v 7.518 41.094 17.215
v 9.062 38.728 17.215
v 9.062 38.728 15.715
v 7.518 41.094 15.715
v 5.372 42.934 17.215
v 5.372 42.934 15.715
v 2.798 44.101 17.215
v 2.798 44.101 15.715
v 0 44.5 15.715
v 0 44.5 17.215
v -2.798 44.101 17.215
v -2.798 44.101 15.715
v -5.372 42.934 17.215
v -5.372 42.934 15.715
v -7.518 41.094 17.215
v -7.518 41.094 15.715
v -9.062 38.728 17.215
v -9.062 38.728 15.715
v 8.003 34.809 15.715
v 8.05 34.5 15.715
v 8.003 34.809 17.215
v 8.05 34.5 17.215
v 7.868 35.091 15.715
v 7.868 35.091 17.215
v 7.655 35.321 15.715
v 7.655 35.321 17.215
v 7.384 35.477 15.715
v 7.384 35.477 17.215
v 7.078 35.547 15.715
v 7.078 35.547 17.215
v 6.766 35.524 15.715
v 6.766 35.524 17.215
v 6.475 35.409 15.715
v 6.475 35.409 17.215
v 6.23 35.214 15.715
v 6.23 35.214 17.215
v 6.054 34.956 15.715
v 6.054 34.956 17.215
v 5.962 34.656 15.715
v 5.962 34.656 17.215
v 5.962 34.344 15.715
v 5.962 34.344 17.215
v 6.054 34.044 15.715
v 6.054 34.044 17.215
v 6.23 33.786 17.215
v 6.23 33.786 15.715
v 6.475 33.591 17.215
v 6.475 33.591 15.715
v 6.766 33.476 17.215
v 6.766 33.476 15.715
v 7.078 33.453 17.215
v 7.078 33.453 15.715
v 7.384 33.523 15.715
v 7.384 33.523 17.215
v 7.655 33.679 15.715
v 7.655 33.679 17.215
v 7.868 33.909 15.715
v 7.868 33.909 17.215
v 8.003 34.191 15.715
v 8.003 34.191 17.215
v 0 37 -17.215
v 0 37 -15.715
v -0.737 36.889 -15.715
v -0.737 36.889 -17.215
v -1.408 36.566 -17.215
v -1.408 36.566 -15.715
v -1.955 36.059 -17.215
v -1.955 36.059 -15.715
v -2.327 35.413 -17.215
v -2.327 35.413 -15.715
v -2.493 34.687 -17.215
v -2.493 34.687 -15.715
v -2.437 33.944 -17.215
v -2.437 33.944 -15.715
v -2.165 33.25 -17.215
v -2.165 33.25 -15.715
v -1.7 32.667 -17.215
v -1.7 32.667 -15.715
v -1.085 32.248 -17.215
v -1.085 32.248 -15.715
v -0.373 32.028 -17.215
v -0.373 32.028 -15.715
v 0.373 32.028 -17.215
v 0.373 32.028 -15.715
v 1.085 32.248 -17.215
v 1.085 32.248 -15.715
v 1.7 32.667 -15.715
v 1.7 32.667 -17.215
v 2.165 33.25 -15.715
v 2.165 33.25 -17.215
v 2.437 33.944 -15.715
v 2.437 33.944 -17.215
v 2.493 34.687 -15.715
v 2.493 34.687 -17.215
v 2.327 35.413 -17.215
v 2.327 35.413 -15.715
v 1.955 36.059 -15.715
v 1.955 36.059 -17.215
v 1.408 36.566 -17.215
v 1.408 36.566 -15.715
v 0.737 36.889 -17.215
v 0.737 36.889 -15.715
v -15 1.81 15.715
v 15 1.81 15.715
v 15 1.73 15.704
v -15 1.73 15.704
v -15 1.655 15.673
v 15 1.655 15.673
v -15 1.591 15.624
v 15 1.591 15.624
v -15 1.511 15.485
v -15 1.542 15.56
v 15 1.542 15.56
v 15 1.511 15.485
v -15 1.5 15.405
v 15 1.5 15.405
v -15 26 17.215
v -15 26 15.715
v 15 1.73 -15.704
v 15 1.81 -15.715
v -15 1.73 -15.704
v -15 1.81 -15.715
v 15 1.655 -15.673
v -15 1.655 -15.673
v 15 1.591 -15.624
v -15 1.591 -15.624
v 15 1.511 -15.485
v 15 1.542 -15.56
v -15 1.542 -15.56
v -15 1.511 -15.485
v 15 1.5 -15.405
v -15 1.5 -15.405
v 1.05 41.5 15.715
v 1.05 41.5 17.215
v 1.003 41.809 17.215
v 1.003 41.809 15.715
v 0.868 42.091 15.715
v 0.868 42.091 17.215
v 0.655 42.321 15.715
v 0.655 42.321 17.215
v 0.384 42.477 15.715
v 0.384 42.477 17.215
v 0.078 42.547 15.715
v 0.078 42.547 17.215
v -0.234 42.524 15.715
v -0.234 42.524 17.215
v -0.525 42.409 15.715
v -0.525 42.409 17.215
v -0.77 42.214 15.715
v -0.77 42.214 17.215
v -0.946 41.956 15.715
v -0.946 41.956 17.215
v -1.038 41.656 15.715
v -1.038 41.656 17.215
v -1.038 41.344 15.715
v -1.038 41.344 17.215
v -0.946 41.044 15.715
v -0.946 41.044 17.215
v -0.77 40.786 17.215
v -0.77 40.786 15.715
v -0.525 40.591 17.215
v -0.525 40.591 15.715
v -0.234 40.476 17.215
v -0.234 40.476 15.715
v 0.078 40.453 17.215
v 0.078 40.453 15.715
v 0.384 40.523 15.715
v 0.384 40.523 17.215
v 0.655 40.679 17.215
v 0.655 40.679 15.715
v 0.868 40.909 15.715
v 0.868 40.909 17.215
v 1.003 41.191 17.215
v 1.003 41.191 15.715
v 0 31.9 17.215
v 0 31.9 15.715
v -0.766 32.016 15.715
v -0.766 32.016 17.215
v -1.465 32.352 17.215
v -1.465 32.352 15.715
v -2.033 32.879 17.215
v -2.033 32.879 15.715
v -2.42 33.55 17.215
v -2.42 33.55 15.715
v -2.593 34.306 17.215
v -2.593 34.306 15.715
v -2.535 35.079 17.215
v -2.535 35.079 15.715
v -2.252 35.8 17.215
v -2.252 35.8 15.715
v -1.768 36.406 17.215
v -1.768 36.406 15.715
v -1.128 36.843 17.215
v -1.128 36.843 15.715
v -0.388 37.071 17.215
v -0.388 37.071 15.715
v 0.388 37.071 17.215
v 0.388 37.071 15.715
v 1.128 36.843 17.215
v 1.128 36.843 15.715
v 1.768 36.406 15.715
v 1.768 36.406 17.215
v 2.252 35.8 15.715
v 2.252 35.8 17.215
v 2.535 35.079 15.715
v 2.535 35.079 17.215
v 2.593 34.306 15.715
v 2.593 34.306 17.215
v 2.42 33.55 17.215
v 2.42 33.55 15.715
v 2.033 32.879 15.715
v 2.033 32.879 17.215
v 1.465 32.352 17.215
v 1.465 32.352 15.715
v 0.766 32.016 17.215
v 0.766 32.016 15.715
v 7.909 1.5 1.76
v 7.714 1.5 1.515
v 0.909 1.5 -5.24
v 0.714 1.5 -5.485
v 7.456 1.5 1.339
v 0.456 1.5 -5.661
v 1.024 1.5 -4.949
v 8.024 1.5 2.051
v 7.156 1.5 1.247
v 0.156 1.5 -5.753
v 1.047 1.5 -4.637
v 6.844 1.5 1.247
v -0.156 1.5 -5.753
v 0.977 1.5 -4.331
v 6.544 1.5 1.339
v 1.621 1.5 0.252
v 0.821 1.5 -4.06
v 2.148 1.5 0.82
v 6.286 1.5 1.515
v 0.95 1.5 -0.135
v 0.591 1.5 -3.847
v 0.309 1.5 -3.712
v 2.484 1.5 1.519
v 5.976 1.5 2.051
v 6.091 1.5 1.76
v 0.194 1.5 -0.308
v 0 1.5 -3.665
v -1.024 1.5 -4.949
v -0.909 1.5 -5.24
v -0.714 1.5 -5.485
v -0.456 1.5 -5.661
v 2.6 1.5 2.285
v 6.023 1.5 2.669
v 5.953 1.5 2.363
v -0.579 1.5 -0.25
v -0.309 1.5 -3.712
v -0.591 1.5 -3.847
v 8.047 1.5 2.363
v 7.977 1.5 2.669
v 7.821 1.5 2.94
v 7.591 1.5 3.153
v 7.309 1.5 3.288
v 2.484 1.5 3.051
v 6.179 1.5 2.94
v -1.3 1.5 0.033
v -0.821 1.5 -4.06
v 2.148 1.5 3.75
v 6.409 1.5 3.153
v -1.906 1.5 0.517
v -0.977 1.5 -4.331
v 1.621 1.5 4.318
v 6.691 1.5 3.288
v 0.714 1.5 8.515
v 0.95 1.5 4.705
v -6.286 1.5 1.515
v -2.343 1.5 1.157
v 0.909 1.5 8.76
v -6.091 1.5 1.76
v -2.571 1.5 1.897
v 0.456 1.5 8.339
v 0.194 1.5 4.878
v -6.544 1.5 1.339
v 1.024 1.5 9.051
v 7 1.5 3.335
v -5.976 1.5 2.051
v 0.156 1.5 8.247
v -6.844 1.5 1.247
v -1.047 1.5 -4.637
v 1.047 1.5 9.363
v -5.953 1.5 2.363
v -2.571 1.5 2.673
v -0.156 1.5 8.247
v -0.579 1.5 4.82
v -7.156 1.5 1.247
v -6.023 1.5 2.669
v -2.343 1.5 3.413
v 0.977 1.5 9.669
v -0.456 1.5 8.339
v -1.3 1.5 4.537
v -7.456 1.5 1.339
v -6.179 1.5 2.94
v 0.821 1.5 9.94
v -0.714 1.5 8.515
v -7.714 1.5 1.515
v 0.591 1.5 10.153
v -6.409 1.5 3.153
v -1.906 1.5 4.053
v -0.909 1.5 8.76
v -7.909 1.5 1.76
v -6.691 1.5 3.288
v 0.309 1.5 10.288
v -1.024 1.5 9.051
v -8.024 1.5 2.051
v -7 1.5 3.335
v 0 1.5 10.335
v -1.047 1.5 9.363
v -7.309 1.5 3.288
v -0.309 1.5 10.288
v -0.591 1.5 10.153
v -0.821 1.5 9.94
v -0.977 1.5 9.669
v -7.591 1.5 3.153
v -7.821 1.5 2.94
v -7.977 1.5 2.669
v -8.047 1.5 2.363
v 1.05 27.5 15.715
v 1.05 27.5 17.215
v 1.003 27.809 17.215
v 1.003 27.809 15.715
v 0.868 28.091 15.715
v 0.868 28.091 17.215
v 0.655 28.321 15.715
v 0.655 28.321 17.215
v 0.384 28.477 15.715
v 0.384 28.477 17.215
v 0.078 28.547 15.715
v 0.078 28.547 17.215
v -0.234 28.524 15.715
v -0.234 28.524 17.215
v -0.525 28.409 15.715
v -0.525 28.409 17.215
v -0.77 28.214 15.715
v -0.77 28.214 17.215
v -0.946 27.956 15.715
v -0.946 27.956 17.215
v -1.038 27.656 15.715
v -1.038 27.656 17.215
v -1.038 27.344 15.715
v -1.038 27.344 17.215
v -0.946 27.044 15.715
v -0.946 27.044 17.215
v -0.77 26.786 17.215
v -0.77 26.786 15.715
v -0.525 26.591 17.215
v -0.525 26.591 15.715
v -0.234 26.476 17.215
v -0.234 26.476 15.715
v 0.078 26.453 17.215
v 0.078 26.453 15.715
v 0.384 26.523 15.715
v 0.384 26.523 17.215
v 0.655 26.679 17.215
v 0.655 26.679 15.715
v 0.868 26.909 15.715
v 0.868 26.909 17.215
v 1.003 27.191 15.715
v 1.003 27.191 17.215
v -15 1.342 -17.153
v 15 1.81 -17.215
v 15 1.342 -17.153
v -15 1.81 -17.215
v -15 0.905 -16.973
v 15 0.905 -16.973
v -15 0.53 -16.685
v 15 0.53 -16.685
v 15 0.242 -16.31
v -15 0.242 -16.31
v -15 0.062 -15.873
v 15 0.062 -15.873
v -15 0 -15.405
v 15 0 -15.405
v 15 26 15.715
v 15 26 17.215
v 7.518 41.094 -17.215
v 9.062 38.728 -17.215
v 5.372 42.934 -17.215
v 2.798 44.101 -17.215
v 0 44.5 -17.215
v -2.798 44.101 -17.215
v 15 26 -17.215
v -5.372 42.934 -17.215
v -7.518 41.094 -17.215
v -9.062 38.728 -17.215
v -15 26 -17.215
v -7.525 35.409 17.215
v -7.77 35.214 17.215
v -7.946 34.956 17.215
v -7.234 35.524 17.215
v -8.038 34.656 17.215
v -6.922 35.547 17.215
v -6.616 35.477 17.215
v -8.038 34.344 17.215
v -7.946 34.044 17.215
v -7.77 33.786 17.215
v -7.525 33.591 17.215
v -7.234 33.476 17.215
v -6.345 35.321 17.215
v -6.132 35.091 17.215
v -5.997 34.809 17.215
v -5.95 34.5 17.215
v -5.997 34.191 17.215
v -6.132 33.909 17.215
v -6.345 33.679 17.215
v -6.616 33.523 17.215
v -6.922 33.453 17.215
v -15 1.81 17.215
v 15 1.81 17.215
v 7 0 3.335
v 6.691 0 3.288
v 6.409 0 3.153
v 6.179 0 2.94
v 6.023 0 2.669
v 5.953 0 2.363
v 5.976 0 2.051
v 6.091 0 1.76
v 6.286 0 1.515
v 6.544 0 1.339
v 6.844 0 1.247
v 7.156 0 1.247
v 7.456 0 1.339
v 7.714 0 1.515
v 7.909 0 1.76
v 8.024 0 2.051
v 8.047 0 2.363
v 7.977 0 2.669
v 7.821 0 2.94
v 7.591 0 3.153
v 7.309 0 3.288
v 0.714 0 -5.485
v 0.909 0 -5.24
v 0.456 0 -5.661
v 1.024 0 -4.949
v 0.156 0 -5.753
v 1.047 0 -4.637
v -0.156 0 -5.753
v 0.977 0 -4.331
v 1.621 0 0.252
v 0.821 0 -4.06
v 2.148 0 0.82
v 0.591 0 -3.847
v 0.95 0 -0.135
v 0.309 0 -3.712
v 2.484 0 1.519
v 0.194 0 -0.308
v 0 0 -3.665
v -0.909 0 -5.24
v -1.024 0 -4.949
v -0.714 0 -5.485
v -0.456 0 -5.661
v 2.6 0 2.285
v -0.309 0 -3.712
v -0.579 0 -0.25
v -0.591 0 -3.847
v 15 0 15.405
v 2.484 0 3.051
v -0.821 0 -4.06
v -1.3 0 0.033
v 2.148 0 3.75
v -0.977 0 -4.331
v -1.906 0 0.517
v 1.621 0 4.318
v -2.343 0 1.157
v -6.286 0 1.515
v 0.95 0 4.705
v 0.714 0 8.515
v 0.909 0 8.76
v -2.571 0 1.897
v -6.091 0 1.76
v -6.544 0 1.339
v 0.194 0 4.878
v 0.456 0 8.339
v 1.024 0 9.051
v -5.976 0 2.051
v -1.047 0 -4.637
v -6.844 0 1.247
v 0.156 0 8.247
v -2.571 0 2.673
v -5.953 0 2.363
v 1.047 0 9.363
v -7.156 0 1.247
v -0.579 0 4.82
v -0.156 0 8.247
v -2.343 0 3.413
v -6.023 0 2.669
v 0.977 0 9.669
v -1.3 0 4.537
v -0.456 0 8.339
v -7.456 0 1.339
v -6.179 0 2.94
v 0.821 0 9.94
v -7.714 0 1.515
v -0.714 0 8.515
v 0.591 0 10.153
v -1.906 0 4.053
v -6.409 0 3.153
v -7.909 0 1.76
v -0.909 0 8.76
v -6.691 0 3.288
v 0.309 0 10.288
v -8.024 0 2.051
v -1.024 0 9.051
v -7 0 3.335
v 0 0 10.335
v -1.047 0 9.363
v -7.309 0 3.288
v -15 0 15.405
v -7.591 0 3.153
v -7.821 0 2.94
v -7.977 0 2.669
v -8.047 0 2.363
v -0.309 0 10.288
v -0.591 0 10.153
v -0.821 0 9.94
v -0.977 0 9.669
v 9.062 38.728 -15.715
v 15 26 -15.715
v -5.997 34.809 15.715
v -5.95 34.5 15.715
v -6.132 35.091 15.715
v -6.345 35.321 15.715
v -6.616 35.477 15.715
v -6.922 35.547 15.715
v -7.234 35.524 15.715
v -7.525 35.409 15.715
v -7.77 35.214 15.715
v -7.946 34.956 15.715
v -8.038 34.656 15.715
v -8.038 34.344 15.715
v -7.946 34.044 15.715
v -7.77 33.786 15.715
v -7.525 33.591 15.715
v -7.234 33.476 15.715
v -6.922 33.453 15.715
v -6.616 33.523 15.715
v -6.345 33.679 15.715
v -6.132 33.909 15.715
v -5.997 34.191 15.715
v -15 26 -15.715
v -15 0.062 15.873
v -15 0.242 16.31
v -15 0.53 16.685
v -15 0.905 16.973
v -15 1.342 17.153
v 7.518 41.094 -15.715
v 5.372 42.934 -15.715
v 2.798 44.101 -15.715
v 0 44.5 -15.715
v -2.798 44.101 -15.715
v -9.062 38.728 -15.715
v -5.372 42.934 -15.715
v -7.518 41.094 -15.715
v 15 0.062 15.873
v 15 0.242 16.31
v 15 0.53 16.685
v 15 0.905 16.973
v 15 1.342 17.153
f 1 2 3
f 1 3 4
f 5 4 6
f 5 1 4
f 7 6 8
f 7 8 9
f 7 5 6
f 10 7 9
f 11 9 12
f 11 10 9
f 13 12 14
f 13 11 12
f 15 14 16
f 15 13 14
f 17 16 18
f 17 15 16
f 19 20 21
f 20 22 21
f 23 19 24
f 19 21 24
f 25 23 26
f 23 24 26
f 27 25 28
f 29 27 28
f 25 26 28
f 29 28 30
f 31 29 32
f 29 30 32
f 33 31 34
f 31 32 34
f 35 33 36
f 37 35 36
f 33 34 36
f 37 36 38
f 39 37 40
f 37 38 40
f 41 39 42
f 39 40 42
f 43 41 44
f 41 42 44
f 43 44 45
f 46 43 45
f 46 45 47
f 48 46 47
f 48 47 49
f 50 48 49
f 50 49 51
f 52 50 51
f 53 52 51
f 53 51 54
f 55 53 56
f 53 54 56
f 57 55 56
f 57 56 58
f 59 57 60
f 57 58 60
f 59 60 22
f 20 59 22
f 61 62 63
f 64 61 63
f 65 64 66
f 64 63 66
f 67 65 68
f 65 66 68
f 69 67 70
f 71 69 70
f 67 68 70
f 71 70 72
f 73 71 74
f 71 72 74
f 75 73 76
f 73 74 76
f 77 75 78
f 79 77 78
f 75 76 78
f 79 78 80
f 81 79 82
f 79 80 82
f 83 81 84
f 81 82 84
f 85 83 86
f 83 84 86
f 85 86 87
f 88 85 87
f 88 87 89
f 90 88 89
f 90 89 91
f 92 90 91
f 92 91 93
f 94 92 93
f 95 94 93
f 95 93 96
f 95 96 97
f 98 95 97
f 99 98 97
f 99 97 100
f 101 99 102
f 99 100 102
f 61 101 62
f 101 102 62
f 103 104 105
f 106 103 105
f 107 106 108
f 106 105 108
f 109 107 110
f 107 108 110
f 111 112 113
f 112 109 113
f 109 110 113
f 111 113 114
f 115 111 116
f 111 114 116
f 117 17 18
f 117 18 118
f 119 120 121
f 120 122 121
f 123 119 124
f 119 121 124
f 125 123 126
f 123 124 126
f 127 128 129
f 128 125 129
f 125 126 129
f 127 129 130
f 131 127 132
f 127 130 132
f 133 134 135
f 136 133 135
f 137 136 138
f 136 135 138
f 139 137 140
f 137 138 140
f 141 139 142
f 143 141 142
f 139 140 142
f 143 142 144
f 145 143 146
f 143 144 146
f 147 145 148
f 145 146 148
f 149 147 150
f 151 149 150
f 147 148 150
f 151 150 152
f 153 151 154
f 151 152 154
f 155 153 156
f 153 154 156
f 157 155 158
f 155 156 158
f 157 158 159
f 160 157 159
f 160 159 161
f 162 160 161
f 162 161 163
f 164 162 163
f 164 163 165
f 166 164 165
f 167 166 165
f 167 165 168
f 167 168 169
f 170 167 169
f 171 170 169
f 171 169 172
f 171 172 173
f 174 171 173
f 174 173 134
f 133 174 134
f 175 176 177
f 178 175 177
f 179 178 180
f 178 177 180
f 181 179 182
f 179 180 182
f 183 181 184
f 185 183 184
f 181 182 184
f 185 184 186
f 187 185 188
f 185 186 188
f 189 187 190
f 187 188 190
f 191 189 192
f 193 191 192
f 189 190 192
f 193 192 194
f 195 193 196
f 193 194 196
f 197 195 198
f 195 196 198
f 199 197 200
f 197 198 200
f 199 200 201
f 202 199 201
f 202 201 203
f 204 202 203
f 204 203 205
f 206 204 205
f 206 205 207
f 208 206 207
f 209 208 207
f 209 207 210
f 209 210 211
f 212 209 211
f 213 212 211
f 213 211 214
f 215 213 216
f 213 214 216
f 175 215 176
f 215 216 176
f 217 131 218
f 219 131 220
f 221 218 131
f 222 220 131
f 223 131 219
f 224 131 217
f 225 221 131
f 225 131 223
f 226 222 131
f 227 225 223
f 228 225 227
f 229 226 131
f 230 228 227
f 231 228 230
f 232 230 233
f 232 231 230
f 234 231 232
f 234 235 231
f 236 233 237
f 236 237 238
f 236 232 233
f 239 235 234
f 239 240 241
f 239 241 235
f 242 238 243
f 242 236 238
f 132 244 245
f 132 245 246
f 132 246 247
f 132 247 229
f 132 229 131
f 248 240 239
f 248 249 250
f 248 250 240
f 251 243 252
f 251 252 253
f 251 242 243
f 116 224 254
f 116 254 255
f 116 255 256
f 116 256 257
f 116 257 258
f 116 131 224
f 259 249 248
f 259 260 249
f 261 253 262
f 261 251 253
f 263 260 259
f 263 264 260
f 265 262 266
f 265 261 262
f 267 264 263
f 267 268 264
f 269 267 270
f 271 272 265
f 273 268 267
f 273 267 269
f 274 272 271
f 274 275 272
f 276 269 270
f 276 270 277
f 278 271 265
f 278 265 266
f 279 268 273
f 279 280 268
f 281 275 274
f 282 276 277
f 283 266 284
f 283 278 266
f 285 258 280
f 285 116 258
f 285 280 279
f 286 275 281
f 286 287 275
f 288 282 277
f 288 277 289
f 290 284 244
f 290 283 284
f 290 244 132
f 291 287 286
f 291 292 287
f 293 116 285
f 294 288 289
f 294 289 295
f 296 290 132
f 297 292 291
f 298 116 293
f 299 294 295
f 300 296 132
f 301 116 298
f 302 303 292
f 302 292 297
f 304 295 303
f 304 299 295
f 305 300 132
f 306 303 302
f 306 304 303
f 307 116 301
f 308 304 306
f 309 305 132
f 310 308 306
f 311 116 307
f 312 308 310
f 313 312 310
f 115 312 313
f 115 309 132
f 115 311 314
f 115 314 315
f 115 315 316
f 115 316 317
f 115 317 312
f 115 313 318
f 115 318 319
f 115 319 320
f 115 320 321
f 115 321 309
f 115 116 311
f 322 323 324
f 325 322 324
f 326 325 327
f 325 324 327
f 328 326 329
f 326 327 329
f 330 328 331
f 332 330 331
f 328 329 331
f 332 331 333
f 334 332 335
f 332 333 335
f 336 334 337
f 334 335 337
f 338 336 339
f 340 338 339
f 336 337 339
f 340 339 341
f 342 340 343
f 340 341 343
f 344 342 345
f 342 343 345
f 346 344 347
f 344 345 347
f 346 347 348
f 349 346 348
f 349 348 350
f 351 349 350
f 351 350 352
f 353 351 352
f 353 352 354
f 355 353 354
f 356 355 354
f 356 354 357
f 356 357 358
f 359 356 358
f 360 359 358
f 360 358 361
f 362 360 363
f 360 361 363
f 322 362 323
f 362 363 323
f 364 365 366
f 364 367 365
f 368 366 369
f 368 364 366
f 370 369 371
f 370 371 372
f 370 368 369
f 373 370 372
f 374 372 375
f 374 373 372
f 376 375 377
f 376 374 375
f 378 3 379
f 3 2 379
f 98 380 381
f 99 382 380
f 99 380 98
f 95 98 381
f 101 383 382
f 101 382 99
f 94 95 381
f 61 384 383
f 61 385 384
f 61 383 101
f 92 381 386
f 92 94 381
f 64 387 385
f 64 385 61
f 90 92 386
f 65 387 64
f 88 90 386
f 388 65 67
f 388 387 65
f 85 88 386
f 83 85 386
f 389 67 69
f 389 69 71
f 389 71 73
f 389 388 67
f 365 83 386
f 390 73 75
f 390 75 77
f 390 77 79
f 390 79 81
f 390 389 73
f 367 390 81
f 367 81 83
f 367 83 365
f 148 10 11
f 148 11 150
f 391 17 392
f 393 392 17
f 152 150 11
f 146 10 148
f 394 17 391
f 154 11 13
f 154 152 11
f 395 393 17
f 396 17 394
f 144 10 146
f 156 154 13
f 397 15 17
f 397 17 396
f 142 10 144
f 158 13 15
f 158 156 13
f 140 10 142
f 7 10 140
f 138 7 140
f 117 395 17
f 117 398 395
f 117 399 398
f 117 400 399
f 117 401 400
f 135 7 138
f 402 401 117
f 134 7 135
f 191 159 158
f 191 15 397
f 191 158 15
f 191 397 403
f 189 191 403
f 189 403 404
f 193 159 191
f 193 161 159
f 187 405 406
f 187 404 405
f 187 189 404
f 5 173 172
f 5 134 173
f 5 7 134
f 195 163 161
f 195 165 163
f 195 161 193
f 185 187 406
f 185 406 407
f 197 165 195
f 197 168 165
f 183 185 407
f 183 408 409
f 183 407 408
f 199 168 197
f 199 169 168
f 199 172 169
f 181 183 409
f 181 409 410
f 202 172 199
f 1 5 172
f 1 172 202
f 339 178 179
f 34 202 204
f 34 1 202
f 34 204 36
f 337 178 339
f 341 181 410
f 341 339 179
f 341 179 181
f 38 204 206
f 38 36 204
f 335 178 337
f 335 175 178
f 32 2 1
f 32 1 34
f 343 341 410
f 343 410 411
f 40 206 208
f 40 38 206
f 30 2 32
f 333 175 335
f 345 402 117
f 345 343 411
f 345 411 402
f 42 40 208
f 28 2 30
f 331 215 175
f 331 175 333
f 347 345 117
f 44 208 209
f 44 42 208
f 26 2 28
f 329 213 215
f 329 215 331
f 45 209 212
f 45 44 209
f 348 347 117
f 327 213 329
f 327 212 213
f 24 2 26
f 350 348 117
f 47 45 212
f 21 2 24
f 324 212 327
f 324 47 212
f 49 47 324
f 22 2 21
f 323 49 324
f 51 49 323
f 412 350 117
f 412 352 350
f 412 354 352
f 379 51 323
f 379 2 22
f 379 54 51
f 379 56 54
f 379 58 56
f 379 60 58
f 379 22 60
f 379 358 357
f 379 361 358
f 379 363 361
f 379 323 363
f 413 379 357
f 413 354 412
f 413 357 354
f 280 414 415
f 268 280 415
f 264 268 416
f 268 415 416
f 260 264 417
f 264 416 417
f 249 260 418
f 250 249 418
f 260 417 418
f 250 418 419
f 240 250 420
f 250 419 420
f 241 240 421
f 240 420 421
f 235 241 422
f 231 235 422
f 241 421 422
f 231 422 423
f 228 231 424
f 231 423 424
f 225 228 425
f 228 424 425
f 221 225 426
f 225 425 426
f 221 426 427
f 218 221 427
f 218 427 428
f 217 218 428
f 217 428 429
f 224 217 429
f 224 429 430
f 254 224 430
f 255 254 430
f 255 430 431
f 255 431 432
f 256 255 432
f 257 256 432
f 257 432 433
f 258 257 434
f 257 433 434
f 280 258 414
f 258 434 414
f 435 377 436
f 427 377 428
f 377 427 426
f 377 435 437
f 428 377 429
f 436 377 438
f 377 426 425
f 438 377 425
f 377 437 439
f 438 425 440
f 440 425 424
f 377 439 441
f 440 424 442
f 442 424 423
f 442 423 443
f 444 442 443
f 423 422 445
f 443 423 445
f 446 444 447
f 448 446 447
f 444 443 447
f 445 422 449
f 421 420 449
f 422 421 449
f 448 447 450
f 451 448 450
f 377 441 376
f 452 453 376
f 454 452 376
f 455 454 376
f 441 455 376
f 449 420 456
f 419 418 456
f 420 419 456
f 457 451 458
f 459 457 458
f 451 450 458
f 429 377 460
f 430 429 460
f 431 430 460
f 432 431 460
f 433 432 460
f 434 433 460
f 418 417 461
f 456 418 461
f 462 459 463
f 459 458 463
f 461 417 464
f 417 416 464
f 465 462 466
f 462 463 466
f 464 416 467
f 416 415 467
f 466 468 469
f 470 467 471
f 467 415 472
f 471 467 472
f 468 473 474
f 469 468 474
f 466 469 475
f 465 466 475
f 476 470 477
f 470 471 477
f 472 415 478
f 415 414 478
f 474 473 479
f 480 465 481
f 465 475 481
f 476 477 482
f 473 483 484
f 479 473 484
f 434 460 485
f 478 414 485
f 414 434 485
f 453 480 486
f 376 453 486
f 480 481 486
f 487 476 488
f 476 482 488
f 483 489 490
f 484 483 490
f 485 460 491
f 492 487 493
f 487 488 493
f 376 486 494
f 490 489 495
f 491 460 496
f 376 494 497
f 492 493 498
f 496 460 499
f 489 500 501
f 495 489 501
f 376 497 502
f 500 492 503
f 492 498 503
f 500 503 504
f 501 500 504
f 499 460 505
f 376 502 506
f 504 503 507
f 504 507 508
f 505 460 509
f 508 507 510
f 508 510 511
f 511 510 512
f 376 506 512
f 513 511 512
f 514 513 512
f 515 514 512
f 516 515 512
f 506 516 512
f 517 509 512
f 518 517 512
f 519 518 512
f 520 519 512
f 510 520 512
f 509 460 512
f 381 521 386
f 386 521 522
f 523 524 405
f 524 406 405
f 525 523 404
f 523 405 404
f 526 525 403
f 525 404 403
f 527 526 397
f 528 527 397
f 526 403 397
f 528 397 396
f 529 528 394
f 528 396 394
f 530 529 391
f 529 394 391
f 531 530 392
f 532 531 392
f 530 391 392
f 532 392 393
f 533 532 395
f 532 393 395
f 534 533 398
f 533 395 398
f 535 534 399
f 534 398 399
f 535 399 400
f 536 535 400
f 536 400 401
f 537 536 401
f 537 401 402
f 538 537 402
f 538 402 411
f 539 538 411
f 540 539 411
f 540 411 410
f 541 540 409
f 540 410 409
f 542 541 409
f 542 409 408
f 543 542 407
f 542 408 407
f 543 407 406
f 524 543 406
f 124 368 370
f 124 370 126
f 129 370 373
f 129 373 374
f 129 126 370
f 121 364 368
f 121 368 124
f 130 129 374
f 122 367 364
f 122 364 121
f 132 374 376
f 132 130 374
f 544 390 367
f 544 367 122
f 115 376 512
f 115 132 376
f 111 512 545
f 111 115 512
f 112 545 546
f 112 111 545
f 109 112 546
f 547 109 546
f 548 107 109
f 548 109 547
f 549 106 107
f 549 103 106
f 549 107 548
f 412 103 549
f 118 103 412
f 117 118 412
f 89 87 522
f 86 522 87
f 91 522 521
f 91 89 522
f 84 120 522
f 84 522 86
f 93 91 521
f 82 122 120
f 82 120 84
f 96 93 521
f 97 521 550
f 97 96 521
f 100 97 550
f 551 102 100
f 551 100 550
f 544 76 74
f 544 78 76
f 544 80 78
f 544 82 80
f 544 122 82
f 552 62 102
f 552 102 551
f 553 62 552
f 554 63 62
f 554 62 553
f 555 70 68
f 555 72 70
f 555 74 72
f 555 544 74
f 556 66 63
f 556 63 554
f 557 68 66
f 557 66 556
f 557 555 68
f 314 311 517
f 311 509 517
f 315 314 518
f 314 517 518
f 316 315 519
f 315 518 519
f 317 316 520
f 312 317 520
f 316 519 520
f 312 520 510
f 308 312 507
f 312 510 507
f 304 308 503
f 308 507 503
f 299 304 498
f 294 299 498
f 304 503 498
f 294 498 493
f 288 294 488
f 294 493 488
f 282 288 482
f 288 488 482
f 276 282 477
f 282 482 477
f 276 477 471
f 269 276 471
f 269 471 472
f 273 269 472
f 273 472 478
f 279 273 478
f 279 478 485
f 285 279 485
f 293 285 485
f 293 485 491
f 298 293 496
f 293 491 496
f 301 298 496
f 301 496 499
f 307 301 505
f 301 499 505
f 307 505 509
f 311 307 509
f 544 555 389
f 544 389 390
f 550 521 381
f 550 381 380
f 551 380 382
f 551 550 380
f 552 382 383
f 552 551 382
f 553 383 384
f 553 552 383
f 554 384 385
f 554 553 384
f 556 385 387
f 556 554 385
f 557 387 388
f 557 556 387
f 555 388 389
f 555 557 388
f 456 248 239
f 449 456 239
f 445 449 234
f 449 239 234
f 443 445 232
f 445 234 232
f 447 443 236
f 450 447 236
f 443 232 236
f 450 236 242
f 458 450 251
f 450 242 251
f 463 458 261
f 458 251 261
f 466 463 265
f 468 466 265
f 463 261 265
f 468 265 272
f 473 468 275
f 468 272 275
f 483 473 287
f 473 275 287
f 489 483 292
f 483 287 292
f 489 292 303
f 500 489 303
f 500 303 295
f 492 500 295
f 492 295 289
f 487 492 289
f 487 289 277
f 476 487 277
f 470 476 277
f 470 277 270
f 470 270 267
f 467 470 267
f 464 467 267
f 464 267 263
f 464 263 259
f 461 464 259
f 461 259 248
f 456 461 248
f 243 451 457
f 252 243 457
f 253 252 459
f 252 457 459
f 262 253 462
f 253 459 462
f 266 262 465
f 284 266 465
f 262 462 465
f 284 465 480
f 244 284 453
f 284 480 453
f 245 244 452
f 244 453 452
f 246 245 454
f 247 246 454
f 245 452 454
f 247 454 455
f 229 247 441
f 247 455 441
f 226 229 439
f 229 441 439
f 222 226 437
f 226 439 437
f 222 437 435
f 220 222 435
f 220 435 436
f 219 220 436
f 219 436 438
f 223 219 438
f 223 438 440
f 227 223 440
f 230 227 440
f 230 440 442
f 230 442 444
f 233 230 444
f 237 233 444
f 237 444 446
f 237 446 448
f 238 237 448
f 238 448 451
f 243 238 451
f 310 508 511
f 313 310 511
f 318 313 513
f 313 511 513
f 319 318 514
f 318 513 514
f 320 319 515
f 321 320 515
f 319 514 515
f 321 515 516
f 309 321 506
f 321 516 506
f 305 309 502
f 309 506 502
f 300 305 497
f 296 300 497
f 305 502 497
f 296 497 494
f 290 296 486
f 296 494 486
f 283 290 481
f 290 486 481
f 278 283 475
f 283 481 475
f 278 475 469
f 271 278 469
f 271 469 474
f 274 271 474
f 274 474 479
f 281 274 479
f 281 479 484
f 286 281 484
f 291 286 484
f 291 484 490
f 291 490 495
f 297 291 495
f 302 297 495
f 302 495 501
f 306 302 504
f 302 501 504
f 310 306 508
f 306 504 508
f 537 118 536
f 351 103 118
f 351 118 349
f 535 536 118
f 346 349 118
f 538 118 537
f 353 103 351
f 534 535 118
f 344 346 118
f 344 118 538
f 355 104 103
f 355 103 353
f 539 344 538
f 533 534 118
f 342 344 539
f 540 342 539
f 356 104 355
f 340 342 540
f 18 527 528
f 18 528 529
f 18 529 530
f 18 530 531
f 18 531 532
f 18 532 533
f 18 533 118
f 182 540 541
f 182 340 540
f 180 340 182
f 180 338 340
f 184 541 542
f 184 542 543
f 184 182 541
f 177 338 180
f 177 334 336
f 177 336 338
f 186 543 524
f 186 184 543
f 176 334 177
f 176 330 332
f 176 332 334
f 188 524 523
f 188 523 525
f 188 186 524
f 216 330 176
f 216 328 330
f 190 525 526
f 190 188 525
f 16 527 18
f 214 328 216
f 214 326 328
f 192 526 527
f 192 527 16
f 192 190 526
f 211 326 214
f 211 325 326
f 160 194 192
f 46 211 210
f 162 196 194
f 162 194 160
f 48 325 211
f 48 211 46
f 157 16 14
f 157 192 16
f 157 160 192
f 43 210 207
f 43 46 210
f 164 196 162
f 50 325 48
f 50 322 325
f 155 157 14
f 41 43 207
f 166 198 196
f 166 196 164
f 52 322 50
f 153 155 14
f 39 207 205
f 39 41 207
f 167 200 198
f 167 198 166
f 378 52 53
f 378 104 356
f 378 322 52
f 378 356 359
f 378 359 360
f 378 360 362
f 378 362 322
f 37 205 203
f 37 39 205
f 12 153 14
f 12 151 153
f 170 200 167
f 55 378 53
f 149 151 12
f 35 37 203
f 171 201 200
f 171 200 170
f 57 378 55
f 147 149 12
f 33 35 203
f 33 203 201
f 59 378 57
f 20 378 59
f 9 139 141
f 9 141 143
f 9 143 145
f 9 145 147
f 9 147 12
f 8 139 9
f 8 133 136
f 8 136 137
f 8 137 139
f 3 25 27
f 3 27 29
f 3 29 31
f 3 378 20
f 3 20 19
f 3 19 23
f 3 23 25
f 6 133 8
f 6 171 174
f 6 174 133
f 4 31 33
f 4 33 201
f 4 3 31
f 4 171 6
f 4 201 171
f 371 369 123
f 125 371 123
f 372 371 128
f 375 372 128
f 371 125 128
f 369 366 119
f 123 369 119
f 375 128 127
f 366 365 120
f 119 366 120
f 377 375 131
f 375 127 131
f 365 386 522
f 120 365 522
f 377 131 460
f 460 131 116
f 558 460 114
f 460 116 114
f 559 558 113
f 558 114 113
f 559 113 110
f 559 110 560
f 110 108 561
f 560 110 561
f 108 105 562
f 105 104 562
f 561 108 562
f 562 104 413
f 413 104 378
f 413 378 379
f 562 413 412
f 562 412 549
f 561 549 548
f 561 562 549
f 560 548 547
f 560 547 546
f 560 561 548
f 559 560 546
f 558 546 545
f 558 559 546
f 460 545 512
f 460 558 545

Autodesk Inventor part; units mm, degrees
ref_plane "YZ Plane" through (0, 0, 0) normal (1, 0, 0) x (0, 1, 0)
ref_plane "XZ Plane" through (0, 0, 0) normal (0, 1, 0) x (-1, 0, 0)
ref_plane "XY Plane" through (0, 0, 0) normal (0, 0, 1) x (1, 0, 0)
sketch "Sketch1" plane through (0, 0, 0) normal (0, 1, 0) x (-1, 0, 0)
  line L0 (15, -15.715) -> (-15, -15.715)
  line L1 (-15, -15.715) -> (-15, 15.715)
  line L2 (-15, 15.715) -> (15, 15.715)
  line L3 (15, 15.715) -> (15, -15.715)
  point P0 (0, 0)
  dimension "d0" = 30
  dimension "d1" = 31.43
  dimension "d2" = 15
  dimension "d3" = 15.715
extrude "Plate1" add sketch "Sketch1" along normal blind 1.5
sketch "Sketch2" plane through (15, 0, 17.215) normal (0, 0, -1) x (-1, 0, 0)
  line L0 (30, 0) -> (0, 0)
  line L1 (0, 0) -> (0, 45)
  line L2 (0, 45) -> (30, 45)
  line L3 (30, 45) -> (30, 0)
edge flange "Flange1" height 45 angle 90 thickness 1.5 bend radius 0.31 thickness toward (0, 0, -1) relief tear relief width 1.5 relief depth 0.75 edges at (0, 1.5, 15.715) wall of the first edge with corners at (-15, 0, 17.215) (15, 0, 17.215) (15, 45, 17.215) (-15, 45, 17.215)
bend "Bend1"
corner "Corner1"
sketch "Sketch3" plane through (-15, 0, -17.215) normal (0, 0, 1) x (1, 0, 0)
  line L0 (30, 0) -> (0, 0)
  line L1 (0, 0) -> (0, 45)
  line L2 (0, 45) -> (30, 45)
  line L3 (30, 45) -> (30, 0)
edge flange "Flange2" height 45 angle 90 thickness 1.5 bend radius 0.31 thickness toward (0, 0, 1) relief tear relief width 1.5 relief depth 0.75 edges at (0, 1.5, -15.715) wall of the first edge with corners at (15, 0, -17.215) (-15, 0, -17.215) (-15, 45, -17.215) (15, 45, -17.215)
bend "Bend2"
corner "Corner2"
sketch "Sketch6" plane through (-15, 45, 17.215) normal (0, 0, 1) x (1, 0, 0)
  circle A0 centre (15, -10.5) radius 10
  line L0 (5, -10.5) -> (5, 9.5)
  line L1 (5, 9.5) -> (25, 9.5)
  line L2 (25, 9.5) -> (25, -10.5)
  line L3 (0, 0) -> (30, 0) projected
  line L4 (0, -43.19) -> (0, 0) projected
  line L5 (5.9376, -6.2723) -> (0, -19)
  line L6 (24.0624, -6.2723) -> (30, -19)
  line L7 (30, -45) -> (0, -45) projected
  line L8 (30, 0) -> (30, -43.19) projected
  point P0 (15, -45)
  point P1 (25, 0)
  point P2 (5, -8.2822)
  point P3 (5, 0)
  point P4 (30, -19)
  point P5 (25, -8.2822)
  dimension "d39" = 34.5
  dimension "d40" = 20
  dimension "d41" = 20
  dimension "d42" = 20
  dimension "d43" = 20
  dimension "d45" = 15
  dimension "d48" = 26
  dimension "d49" = 26
  dimension "d50" = 0
extrude "Extrusion1" cut sketch "Sketch6" against normal blind 50 contours A0 L5 L0 L3 L2 L6 | L2 L3 L8 L6 | L5 L4 L3 L0
sketch "Sketch7" plane through (-15, 1.81, 17.215) normal (0, 0, 1) x (1, 0, 0)
  arc A0 (24.0624, 36.9177) -> (5.9376, 36.9177) centre (15, 32.69) ccw projected
  circle A1 centre (22, 32.69) radius 1.05
  circle A2 centre (15, 39.69) radius 1.05
  circle A3 centre (8, 32.69) radius 1.05
  circle A4 centre (15, 25.69) radius 1.05
  point P0 (15, -1.81)
  dimension "d51" = 7
  dimension "d52" = 2.1
  dimension "d55" = 360
extrude "Extrusion2" cut sketch "Sketch7" against normal blind 20
sketch "Sketch8" plane through (0, 1.5, 0) normal (0, 1, 0) x (1, 0, 0)
  line L0 (15, 15.715) -> (9.0624, 15.715) projected
  line L1 (9.0624, 15.715) -> (-9.0624, 15.715) projected
  line L2 (-9.0624, 15.715) -> (-15, 15.715) projected
  line L3 (-15, 15.715) -> (15, 15.715) projected
  circle A0 centre (0, -2.285) radius 2.6
  point P0 (0, 0)
  point P1 (7, -2.285)
  point P2 (0, 4.715)
  point P3 (-7, -2.285)
  point P4 (0, -9.285)
  dimension "d59" = 18
  dimension "d60" = 0
  dimension "d61" = 5.2
  dimension "d62" = 7
  dimension "d63" = 0
  dimension "d66" = 360
extrude "Extrusion3" cut sketch "Sketch8" against normal blind 10
sketch "Sketch9" plane through (0, 1.5, 0) normal (0, 1, 0) x (1, 0, 0)
  point P0 (0, 0)
hole "Hole3" at (0, 1.5, -4.715) at (7, 1.5, 2.285) at (-7, 1.5, 2.285) at (0, 1.5, 9.285) direction (0, -1, 0) diameter 2.1 depth 1.5
hole "Hole4" at (0, 34.5, 17.215) direction (0, 0, -1) diameter 5.2 depth 1.5 clearance for "Hex Head Bolt" size "M5" standard "Ansi Metric M Profile"
sketch "Sketch10" plane through (15, 1.81, -17.215) normal (0, 0, -1) x (-1, 0, 0)
  circle A0 centre (15, 32.69) radius 2.6 projected
  point P0 (15, -1.81)
hole "Hole5" at (0, 34.5, -17.215) direction (0, 0, 1) diameter 5 depth 1.5 clearance for "Hex Head Bolt" size "M5" standard "Ansi Metric M Profile"
equation "\"d75\" = Thickness"
equation "\"d82\" = Thickness"
equation "\"d89\" = Thickness"
equation "\"d4\" = Thickness"
equation "\"d5\" = BendReliefWidth"
equation "\"d6\" = BendReliefDepth"
equation "\"d7\" = MinimumRemnant"
equation "\"d8\" = TransitionRadius"
equation "\"d11\" = BendRadius"
equation "\"d12\" = CornerReliefSize"
equation "\"d13\" = GapSize"
equation "\"d14\" = JacobiRadiusSize"
equation "\"d15\" = BendReliefWidth"
equation "\"d16\" = BendReliefDepth"
equation "\"d17\" = MinimumRemnant"
equation "\"d18\" = TransitionRadius"
equation "\"d21\" = BendRadius"
equation "\"d22\" = CornerReliefSize"
equation "\"d23\" = GapSize"
equation "\"d24\" = JacobiRadiusSize"
equation "\"BendReliefWidth\" = Thickness"
equation "\"BendReliefDepth\" = 0.5 * Thickness"
equation "\"CornerReliefSize\" = 4 * Thickness"
equation "\"MinimumRemnant\" = 2 * Thickness"
equation "\"TransitionRadius\" = BendRadius"
equation "\"JacobiRadiusSize\" = BendRadius"
equation "\"GapSize\" = Thickness"
equation "\"Thickness\" = 1.5"
equation "\"BendRadius\" = 0.31"
properties part number "axis_7_top_frame" material "Aluminum 6061-AHC"
